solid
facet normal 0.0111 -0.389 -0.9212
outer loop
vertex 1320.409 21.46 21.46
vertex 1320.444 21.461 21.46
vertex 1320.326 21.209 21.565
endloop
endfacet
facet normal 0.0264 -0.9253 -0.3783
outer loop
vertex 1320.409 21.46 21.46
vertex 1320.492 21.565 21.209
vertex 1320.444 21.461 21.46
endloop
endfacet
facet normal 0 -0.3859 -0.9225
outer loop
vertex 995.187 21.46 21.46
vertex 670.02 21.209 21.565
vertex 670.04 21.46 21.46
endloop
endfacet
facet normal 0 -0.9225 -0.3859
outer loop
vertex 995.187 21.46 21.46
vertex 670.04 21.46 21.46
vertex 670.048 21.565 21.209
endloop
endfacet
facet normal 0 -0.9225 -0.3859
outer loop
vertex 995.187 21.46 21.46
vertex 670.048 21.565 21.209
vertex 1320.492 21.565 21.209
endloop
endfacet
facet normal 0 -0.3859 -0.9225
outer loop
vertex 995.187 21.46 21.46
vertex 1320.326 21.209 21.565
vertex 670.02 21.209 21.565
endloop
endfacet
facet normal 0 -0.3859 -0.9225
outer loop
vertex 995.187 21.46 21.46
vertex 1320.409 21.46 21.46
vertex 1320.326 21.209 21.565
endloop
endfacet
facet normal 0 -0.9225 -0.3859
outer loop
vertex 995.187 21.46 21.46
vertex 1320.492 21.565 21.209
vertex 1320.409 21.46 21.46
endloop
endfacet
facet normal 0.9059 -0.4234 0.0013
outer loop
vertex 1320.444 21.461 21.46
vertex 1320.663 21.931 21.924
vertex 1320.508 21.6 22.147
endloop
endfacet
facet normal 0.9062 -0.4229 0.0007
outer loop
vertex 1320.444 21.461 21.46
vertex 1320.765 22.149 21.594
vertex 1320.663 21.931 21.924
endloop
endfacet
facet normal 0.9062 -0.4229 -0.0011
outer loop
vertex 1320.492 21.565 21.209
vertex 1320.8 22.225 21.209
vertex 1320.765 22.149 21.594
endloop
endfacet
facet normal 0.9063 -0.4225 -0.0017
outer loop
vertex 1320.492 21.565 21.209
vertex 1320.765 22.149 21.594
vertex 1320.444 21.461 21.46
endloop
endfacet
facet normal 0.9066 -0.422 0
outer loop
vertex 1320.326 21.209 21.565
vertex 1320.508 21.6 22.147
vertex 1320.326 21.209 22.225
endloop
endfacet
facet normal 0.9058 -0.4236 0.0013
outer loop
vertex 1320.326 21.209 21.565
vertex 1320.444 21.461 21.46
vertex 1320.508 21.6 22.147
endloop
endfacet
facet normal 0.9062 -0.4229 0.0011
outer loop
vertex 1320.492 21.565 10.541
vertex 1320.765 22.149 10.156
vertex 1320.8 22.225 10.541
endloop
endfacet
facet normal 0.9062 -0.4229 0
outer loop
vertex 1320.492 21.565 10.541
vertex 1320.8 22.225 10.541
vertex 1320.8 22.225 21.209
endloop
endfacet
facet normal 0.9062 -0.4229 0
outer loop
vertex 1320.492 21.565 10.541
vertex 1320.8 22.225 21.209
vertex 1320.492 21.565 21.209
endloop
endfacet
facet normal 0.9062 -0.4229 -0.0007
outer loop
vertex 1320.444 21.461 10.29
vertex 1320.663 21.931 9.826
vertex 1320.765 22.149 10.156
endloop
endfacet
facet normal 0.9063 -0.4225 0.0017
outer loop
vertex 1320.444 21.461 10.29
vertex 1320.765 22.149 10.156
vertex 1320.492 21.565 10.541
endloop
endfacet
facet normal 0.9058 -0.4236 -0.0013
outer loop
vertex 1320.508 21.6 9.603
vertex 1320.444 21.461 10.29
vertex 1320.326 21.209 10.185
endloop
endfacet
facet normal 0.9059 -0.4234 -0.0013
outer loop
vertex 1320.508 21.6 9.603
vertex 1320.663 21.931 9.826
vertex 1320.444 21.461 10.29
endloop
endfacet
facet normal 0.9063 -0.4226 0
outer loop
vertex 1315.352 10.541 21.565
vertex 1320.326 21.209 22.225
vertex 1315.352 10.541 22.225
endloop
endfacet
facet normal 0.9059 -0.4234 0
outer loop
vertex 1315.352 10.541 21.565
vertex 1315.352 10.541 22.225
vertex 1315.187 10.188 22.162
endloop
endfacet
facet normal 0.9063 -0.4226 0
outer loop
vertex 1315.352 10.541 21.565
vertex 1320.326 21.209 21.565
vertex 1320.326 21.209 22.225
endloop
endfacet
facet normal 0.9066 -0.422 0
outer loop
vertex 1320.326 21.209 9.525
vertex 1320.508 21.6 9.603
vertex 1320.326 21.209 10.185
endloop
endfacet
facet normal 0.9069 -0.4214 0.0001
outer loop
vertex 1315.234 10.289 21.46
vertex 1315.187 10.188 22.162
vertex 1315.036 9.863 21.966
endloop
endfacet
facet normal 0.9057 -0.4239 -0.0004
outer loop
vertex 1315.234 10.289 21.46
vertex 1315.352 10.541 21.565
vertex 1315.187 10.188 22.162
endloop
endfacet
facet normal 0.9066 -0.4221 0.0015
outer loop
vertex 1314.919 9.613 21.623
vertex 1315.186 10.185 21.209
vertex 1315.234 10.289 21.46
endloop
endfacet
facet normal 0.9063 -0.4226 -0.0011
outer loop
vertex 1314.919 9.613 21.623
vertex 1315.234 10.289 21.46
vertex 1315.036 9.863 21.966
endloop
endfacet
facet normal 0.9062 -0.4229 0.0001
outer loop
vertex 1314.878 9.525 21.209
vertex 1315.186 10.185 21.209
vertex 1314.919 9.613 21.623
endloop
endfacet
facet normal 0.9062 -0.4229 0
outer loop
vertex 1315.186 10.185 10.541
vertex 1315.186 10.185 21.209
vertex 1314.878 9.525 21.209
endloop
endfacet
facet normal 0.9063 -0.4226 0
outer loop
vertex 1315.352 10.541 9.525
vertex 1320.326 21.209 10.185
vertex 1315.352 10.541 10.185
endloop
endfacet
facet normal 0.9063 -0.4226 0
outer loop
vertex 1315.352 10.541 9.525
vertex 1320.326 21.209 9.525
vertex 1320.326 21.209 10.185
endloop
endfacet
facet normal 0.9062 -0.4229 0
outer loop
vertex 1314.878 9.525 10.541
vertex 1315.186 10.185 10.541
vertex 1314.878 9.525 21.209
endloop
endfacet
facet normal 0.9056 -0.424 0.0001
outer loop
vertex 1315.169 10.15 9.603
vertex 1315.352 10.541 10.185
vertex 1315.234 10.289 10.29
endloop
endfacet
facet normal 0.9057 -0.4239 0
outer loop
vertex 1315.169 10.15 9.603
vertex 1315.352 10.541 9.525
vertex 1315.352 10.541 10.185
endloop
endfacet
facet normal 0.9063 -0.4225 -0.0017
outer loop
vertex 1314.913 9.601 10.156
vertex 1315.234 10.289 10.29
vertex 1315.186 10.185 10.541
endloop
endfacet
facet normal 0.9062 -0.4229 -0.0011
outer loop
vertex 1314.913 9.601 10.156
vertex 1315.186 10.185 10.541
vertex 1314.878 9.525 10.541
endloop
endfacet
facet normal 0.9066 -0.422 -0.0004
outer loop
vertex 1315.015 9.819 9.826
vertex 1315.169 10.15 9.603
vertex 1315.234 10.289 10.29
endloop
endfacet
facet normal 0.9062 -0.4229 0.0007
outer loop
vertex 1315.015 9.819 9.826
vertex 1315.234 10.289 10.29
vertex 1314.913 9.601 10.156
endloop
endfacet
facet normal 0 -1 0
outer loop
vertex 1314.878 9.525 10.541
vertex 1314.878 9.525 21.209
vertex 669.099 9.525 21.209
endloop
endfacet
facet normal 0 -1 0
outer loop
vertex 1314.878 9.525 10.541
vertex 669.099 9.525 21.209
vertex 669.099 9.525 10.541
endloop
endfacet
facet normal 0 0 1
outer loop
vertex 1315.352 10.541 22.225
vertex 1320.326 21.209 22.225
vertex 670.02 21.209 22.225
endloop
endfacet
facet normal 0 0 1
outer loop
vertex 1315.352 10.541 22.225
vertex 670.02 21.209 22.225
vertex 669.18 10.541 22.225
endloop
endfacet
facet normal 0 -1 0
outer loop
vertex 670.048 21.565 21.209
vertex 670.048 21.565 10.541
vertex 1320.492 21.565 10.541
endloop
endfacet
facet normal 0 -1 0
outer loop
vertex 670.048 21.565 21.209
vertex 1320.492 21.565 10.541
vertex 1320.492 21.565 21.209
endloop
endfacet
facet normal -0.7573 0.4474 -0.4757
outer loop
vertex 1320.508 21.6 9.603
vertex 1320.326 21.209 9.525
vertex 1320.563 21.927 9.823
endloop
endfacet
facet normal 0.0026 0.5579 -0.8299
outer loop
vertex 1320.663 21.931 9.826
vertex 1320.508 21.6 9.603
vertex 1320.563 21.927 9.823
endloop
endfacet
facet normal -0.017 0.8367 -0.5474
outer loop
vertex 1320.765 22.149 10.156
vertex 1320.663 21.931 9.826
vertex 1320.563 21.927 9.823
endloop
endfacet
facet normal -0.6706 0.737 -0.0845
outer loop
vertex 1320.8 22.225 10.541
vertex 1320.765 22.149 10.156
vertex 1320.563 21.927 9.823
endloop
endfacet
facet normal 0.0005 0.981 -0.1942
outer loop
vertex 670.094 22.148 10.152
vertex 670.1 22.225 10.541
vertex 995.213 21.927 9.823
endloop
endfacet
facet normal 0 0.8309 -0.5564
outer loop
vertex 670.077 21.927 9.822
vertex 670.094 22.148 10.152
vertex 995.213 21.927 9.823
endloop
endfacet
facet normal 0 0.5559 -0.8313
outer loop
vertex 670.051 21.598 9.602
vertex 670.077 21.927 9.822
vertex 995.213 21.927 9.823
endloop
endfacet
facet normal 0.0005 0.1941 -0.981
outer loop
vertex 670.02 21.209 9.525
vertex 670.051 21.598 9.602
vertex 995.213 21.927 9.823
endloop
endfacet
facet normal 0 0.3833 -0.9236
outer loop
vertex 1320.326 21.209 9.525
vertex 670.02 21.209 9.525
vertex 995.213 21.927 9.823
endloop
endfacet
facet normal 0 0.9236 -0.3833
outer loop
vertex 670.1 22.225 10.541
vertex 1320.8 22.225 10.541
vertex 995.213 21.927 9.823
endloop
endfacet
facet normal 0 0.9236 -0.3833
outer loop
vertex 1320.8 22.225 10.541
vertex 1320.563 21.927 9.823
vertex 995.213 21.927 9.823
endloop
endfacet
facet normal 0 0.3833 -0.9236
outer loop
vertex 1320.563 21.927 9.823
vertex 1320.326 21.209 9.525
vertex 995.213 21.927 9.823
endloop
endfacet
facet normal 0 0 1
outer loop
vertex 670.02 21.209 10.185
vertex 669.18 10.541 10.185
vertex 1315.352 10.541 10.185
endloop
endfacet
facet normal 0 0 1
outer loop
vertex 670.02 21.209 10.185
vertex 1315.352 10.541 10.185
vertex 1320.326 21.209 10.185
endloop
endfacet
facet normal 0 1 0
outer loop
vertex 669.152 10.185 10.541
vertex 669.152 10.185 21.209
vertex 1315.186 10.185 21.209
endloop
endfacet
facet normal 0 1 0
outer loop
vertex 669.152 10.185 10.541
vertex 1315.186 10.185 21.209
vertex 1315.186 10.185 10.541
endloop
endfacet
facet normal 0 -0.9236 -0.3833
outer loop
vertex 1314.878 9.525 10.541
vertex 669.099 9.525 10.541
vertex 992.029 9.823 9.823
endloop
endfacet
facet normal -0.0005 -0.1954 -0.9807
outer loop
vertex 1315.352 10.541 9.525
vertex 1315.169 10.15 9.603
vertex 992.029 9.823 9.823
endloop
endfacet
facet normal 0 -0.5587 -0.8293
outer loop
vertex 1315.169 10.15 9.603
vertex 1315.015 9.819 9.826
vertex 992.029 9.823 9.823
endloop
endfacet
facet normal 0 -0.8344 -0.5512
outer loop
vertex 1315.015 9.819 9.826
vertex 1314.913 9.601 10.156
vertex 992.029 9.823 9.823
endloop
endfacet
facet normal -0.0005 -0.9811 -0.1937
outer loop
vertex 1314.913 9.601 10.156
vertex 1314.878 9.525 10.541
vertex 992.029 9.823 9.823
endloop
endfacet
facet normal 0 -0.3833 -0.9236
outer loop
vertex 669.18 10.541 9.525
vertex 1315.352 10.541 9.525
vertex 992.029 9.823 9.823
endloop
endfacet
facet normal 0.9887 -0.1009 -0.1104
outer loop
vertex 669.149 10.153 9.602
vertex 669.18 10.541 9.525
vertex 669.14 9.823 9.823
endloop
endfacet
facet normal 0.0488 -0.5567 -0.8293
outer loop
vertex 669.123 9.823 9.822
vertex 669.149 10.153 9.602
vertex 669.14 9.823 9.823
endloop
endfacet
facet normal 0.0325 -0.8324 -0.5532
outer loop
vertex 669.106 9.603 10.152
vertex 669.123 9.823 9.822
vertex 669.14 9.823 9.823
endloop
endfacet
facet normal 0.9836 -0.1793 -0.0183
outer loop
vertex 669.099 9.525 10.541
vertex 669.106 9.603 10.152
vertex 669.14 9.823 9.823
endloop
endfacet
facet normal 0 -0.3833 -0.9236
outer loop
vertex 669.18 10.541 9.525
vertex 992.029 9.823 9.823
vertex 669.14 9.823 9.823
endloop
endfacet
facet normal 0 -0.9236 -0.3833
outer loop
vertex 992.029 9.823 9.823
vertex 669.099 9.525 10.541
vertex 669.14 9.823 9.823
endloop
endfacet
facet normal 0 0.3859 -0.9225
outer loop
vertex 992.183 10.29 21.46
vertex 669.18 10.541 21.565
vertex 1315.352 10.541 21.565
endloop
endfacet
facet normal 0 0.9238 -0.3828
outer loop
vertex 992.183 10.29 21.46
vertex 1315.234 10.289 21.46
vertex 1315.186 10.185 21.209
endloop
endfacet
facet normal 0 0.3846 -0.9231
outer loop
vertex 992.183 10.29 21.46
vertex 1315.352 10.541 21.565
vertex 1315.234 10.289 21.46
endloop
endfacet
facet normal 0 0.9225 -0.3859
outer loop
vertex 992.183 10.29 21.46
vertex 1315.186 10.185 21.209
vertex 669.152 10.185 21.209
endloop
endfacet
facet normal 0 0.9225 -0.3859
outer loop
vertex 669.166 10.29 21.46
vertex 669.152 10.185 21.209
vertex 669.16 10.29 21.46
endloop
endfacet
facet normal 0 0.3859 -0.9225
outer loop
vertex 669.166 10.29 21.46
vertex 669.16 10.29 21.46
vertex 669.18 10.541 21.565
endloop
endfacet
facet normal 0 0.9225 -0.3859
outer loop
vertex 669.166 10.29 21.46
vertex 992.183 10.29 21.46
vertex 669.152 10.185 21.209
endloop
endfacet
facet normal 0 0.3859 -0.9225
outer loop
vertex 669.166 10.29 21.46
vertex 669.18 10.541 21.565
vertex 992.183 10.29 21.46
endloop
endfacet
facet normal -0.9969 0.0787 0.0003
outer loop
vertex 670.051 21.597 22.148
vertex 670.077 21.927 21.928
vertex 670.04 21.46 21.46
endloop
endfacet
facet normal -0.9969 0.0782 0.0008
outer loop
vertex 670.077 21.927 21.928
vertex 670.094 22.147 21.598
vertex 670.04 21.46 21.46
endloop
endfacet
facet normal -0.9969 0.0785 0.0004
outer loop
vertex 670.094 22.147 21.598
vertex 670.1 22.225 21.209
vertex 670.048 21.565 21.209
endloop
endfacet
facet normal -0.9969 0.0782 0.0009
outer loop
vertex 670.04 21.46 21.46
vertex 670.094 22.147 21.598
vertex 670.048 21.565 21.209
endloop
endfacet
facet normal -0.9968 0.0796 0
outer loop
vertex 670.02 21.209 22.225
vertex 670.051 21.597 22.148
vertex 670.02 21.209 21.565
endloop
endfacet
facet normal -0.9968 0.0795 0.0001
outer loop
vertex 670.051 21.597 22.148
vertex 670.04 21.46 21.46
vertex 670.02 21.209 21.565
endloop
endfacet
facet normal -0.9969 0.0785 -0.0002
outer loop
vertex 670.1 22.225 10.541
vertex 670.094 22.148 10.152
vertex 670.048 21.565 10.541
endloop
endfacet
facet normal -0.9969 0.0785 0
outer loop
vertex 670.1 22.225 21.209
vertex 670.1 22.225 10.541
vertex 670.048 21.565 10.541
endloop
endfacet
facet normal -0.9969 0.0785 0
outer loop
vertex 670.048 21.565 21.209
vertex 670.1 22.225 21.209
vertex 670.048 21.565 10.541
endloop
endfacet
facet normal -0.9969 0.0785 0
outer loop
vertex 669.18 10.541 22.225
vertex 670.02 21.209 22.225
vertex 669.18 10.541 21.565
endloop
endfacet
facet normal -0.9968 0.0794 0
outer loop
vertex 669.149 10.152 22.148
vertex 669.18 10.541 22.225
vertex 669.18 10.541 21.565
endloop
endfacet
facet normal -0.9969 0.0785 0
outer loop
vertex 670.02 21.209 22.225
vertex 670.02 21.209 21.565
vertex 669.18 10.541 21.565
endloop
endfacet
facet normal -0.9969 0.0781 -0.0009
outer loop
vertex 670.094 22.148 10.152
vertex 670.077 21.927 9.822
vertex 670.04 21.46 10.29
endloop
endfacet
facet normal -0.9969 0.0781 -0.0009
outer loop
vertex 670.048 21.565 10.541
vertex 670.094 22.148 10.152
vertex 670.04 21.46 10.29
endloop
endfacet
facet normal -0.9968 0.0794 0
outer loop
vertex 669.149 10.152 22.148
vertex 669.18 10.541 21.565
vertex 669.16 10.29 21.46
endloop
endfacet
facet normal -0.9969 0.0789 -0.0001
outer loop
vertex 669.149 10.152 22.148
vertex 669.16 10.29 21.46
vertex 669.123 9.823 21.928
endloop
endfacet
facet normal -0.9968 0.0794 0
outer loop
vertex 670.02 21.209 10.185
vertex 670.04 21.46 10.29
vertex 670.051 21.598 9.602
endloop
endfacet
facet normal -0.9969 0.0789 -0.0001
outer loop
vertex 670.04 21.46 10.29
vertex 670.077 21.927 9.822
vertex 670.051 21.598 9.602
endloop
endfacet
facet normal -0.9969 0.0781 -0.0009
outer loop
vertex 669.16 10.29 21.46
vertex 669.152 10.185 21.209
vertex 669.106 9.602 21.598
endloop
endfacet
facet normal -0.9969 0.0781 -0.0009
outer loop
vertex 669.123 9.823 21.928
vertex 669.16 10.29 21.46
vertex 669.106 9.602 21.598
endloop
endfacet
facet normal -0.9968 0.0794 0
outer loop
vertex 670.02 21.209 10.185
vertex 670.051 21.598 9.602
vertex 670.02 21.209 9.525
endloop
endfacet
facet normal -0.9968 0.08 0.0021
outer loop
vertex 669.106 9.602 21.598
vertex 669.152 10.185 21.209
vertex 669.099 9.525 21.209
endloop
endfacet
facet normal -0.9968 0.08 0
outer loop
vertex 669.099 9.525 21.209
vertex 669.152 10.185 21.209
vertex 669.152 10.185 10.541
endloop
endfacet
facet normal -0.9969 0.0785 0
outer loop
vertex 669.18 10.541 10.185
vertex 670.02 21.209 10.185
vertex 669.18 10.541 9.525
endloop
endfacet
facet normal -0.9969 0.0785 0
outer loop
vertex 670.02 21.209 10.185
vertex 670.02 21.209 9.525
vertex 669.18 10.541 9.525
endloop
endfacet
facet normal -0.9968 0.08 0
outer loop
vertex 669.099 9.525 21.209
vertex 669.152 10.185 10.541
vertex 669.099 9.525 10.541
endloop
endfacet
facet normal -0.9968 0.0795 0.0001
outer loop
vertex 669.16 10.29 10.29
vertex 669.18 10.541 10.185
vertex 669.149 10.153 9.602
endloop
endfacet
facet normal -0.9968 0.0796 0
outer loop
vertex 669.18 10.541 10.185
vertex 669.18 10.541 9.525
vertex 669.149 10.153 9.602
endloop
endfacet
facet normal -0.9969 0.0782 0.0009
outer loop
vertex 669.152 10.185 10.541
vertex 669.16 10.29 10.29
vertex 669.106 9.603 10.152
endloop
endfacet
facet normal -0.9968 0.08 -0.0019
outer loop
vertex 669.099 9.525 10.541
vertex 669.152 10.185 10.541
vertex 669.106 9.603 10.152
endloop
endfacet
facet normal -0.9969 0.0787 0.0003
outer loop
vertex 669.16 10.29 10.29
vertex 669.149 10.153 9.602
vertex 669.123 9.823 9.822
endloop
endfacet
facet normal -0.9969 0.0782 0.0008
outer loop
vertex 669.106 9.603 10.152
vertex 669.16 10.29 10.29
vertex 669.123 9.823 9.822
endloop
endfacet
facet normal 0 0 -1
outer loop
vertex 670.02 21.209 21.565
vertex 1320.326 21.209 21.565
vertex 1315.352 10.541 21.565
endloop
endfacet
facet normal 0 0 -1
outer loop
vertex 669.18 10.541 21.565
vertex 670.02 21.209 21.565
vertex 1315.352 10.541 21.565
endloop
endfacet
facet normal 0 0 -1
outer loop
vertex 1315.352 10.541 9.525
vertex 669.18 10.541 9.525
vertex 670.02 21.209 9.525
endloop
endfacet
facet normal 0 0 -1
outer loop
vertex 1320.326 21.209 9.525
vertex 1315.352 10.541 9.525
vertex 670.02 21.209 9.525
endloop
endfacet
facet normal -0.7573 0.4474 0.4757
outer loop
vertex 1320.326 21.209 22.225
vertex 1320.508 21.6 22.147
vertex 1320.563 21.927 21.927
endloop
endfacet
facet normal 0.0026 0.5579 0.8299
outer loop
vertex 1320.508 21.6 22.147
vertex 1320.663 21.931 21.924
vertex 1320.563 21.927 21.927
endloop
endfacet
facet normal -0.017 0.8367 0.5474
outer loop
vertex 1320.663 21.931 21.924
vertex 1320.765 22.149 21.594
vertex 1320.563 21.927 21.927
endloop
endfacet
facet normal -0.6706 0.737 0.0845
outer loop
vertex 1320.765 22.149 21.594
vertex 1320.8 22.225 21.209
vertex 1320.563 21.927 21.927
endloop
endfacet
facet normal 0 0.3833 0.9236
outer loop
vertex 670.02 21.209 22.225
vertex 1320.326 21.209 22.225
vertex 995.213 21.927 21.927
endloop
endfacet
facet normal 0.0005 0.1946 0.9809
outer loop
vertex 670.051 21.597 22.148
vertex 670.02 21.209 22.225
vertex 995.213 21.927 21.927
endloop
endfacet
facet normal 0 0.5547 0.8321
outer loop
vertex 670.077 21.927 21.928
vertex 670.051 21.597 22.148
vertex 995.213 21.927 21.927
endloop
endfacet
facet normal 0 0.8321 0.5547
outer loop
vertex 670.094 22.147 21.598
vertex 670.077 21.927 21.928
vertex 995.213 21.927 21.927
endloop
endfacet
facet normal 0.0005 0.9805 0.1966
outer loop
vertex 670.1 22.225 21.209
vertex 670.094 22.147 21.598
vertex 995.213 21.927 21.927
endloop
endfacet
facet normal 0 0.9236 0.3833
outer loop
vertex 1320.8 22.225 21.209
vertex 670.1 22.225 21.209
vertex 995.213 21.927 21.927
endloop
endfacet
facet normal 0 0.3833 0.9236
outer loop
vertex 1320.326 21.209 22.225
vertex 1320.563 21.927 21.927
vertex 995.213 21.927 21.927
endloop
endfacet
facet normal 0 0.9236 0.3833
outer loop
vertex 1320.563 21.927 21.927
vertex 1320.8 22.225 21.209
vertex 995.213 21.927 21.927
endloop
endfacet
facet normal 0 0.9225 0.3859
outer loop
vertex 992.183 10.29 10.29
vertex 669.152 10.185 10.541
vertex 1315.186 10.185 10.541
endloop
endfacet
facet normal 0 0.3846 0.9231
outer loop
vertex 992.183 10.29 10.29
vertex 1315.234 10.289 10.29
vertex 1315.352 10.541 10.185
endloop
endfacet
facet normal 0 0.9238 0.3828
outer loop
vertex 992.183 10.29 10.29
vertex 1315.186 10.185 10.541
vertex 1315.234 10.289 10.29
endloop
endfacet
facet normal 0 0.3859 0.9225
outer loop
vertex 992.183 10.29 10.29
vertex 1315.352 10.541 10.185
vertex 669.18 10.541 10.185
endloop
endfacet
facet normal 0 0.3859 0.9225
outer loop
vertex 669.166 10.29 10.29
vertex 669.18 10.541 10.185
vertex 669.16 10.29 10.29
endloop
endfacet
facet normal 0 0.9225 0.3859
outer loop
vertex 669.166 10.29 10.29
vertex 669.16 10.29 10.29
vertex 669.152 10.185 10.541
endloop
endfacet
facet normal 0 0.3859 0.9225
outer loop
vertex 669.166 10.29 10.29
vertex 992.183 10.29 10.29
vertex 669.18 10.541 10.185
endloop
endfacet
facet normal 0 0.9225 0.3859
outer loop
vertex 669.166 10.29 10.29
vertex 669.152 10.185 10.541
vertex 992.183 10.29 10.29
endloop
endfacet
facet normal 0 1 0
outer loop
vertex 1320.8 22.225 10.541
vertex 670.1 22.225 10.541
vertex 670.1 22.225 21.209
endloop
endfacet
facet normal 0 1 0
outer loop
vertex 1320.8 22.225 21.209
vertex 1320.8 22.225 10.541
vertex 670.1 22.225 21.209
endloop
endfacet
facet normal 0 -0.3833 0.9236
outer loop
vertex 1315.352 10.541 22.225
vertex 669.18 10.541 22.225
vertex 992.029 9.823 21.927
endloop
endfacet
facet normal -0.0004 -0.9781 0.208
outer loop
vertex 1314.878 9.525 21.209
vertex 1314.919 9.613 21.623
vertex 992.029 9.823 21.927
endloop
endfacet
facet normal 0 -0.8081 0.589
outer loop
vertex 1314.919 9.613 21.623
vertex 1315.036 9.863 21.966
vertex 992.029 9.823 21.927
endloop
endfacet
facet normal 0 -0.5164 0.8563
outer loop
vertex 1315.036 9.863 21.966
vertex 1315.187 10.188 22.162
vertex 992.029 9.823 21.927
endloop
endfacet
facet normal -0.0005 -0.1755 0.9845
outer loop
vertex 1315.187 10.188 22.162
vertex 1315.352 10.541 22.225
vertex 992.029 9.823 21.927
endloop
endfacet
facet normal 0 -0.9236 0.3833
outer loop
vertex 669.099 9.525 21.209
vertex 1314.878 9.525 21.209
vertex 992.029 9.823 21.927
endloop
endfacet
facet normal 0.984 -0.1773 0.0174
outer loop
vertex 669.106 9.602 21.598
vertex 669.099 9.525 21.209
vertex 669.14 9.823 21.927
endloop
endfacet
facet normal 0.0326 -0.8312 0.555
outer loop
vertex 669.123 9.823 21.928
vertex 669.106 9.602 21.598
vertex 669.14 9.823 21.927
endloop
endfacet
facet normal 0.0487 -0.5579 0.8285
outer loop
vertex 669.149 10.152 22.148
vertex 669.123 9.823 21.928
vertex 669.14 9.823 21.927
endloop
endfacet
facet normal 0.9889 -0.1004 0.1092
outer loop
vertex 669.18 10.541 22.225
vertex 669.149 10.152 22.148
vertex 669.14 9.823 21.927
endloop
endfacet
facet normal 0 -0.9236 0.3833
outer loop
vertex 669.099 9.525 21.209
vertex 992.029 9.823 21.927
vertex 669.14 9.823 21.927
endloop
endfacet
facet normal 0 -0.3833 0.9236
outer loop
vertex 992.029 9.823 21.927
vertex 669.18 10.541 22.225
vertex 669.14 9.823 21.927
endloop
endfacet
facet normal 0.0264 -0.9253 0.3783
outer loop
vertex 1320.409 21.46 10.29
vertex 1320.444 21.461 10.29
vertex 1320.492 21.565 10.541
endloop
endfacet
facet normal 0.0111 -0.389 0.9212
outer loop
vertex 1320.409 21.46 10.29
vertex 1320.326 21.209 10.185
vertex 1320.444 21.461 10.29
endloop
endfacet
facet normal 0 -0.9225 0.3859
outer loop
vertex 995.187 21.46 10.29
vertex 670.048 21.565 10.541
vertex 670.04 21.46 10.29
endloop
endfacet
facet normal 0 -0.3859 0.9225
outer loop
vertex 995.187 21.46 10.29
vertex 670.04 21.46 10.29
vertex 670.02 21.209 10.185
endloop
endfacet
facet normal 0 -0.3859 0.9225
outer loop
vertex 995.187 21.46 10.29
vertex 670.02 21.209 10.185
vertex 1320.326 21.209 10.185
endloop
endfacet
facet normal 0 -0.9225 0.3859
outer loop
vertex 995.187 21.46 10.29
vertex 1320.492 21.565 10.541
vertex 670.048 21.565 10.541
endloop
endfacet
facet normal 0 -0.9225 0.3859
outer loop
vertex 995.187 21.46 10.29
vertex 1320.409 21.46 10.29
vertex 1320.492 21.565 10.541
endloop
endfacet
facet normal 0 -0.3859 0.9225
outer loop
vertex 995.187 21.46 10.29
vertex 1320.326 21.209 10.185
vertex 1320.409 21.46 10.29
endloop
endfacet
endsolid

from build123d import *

# Parameters (mm, degrees)
BOSS_EXTRUDE1_DEPTH = 1320.8
SCALE4_SCALE_X      = 1
SCALE4_SCALE_Y      = 0.4
SCALE4_SCALE_Z      = 0.4
CUT_EXTRUDE1_DEPTH  = 1322.04802369


with BuildPart() as part:
    # Sketch1 → Boss-Extrude1 (new body)
    with BuildSketch(Plane(origin=(0, 0, 0), x_dir=(0, 0, -1), z_dir=(1, 0, 0))):
        with BuildLine():
            Line((0, 2.54), (0, 29.21))
            ThreePointArc((0, 29.21), (-0.743948776, 31.006051224), (-2.54, 31.75))
            Line((-2.54, 31.75), (-29.21, 31.75))
            ThreePointArc((-29.21, 31.75), (-31.006051224, 31.006051224), (-31.75, 29.21))
            Line((-31.75, 29.21), (-31.75, 2.54))
            ThreePointArc((-31.75, 2.54), (-31.006051224, 0.743948776), (-29.21, 0))
            Line((-29.21, 0), (-2.54, 0))
            ThreePointArc((-2.54, 0), (-0.743948776, 0.743948776), (0, 2.54))
        make_face()
        with BuildLine():
            Line((-1.651, 2.54), (-1.651, 29.21))
            ThreePointArc((-1.651, 29.21), (-1.911382072, 29.838617928), (-2.54, 30.099))
            Line((-2.54, 30.099), (-29.21, 30.099))
            ThreePointArc((-29.21, 30.099), (-29.838617928, 29.838617928), (-30.099, 29.21))
            Line((-30.099, 29.21), (-30.099, 2.54))
            ThreePointArc((-30.099, 2.54), (-29.838617928, 1.911382072), (-29.21, 1.651))
            Line((-29.21, 1.651), (-2.54, 1.651))
            ThreePointArc((-2.54, 1.651), (-1.911382072, 1.911382072), (-1.651, 2.54))
        make_face(mode=Mode.SUBTRACT)
    extrude(amount=BOSS_EXTRUDE1_DEPTH)


with BuildPart() as part_1:
    # Scale4: scaled about (660.4, 15.875, 15.875)
    add(part.part.scale((SCALE4_SCALE_X, SCALE4_SCALE_Y, SCALE4_SCALE_Z), about=(660.4, 15.875, 15.875)))

    # Sketch3 → Cut-Extrude1 (cut, through all)
    with BuildSketch(Plane(origin=(0, 0, 9.525), x_dir=(-1, 0, 0), z_dir=(0, 0, -1))):
        Polygon((-1320.8, 22.225), (-1314.877892741, 9.525), (-1320.8, 9.525), align=None)
        Polygon((-670.100451899, 22.225), (-669.099476758, 9.525), (-619.573747082, 9.525), (-619.573747082, 22.225), align=None)
    extrude(amount=-CUT_EXTRUDE1_DEPTH, mode=Mode.SUBTRACT)


with BuildPart() as cut_extrude1_kept_piece:
    # of the separate pieces the step leaves, the one the design keeps (cut_extrude1_pieces_kept)
    add(part_1.part.solids().sort_by_distance((670.020373888, 21.209, 9.525))[0])


solid = cut_extrude1_kept_piece.part
